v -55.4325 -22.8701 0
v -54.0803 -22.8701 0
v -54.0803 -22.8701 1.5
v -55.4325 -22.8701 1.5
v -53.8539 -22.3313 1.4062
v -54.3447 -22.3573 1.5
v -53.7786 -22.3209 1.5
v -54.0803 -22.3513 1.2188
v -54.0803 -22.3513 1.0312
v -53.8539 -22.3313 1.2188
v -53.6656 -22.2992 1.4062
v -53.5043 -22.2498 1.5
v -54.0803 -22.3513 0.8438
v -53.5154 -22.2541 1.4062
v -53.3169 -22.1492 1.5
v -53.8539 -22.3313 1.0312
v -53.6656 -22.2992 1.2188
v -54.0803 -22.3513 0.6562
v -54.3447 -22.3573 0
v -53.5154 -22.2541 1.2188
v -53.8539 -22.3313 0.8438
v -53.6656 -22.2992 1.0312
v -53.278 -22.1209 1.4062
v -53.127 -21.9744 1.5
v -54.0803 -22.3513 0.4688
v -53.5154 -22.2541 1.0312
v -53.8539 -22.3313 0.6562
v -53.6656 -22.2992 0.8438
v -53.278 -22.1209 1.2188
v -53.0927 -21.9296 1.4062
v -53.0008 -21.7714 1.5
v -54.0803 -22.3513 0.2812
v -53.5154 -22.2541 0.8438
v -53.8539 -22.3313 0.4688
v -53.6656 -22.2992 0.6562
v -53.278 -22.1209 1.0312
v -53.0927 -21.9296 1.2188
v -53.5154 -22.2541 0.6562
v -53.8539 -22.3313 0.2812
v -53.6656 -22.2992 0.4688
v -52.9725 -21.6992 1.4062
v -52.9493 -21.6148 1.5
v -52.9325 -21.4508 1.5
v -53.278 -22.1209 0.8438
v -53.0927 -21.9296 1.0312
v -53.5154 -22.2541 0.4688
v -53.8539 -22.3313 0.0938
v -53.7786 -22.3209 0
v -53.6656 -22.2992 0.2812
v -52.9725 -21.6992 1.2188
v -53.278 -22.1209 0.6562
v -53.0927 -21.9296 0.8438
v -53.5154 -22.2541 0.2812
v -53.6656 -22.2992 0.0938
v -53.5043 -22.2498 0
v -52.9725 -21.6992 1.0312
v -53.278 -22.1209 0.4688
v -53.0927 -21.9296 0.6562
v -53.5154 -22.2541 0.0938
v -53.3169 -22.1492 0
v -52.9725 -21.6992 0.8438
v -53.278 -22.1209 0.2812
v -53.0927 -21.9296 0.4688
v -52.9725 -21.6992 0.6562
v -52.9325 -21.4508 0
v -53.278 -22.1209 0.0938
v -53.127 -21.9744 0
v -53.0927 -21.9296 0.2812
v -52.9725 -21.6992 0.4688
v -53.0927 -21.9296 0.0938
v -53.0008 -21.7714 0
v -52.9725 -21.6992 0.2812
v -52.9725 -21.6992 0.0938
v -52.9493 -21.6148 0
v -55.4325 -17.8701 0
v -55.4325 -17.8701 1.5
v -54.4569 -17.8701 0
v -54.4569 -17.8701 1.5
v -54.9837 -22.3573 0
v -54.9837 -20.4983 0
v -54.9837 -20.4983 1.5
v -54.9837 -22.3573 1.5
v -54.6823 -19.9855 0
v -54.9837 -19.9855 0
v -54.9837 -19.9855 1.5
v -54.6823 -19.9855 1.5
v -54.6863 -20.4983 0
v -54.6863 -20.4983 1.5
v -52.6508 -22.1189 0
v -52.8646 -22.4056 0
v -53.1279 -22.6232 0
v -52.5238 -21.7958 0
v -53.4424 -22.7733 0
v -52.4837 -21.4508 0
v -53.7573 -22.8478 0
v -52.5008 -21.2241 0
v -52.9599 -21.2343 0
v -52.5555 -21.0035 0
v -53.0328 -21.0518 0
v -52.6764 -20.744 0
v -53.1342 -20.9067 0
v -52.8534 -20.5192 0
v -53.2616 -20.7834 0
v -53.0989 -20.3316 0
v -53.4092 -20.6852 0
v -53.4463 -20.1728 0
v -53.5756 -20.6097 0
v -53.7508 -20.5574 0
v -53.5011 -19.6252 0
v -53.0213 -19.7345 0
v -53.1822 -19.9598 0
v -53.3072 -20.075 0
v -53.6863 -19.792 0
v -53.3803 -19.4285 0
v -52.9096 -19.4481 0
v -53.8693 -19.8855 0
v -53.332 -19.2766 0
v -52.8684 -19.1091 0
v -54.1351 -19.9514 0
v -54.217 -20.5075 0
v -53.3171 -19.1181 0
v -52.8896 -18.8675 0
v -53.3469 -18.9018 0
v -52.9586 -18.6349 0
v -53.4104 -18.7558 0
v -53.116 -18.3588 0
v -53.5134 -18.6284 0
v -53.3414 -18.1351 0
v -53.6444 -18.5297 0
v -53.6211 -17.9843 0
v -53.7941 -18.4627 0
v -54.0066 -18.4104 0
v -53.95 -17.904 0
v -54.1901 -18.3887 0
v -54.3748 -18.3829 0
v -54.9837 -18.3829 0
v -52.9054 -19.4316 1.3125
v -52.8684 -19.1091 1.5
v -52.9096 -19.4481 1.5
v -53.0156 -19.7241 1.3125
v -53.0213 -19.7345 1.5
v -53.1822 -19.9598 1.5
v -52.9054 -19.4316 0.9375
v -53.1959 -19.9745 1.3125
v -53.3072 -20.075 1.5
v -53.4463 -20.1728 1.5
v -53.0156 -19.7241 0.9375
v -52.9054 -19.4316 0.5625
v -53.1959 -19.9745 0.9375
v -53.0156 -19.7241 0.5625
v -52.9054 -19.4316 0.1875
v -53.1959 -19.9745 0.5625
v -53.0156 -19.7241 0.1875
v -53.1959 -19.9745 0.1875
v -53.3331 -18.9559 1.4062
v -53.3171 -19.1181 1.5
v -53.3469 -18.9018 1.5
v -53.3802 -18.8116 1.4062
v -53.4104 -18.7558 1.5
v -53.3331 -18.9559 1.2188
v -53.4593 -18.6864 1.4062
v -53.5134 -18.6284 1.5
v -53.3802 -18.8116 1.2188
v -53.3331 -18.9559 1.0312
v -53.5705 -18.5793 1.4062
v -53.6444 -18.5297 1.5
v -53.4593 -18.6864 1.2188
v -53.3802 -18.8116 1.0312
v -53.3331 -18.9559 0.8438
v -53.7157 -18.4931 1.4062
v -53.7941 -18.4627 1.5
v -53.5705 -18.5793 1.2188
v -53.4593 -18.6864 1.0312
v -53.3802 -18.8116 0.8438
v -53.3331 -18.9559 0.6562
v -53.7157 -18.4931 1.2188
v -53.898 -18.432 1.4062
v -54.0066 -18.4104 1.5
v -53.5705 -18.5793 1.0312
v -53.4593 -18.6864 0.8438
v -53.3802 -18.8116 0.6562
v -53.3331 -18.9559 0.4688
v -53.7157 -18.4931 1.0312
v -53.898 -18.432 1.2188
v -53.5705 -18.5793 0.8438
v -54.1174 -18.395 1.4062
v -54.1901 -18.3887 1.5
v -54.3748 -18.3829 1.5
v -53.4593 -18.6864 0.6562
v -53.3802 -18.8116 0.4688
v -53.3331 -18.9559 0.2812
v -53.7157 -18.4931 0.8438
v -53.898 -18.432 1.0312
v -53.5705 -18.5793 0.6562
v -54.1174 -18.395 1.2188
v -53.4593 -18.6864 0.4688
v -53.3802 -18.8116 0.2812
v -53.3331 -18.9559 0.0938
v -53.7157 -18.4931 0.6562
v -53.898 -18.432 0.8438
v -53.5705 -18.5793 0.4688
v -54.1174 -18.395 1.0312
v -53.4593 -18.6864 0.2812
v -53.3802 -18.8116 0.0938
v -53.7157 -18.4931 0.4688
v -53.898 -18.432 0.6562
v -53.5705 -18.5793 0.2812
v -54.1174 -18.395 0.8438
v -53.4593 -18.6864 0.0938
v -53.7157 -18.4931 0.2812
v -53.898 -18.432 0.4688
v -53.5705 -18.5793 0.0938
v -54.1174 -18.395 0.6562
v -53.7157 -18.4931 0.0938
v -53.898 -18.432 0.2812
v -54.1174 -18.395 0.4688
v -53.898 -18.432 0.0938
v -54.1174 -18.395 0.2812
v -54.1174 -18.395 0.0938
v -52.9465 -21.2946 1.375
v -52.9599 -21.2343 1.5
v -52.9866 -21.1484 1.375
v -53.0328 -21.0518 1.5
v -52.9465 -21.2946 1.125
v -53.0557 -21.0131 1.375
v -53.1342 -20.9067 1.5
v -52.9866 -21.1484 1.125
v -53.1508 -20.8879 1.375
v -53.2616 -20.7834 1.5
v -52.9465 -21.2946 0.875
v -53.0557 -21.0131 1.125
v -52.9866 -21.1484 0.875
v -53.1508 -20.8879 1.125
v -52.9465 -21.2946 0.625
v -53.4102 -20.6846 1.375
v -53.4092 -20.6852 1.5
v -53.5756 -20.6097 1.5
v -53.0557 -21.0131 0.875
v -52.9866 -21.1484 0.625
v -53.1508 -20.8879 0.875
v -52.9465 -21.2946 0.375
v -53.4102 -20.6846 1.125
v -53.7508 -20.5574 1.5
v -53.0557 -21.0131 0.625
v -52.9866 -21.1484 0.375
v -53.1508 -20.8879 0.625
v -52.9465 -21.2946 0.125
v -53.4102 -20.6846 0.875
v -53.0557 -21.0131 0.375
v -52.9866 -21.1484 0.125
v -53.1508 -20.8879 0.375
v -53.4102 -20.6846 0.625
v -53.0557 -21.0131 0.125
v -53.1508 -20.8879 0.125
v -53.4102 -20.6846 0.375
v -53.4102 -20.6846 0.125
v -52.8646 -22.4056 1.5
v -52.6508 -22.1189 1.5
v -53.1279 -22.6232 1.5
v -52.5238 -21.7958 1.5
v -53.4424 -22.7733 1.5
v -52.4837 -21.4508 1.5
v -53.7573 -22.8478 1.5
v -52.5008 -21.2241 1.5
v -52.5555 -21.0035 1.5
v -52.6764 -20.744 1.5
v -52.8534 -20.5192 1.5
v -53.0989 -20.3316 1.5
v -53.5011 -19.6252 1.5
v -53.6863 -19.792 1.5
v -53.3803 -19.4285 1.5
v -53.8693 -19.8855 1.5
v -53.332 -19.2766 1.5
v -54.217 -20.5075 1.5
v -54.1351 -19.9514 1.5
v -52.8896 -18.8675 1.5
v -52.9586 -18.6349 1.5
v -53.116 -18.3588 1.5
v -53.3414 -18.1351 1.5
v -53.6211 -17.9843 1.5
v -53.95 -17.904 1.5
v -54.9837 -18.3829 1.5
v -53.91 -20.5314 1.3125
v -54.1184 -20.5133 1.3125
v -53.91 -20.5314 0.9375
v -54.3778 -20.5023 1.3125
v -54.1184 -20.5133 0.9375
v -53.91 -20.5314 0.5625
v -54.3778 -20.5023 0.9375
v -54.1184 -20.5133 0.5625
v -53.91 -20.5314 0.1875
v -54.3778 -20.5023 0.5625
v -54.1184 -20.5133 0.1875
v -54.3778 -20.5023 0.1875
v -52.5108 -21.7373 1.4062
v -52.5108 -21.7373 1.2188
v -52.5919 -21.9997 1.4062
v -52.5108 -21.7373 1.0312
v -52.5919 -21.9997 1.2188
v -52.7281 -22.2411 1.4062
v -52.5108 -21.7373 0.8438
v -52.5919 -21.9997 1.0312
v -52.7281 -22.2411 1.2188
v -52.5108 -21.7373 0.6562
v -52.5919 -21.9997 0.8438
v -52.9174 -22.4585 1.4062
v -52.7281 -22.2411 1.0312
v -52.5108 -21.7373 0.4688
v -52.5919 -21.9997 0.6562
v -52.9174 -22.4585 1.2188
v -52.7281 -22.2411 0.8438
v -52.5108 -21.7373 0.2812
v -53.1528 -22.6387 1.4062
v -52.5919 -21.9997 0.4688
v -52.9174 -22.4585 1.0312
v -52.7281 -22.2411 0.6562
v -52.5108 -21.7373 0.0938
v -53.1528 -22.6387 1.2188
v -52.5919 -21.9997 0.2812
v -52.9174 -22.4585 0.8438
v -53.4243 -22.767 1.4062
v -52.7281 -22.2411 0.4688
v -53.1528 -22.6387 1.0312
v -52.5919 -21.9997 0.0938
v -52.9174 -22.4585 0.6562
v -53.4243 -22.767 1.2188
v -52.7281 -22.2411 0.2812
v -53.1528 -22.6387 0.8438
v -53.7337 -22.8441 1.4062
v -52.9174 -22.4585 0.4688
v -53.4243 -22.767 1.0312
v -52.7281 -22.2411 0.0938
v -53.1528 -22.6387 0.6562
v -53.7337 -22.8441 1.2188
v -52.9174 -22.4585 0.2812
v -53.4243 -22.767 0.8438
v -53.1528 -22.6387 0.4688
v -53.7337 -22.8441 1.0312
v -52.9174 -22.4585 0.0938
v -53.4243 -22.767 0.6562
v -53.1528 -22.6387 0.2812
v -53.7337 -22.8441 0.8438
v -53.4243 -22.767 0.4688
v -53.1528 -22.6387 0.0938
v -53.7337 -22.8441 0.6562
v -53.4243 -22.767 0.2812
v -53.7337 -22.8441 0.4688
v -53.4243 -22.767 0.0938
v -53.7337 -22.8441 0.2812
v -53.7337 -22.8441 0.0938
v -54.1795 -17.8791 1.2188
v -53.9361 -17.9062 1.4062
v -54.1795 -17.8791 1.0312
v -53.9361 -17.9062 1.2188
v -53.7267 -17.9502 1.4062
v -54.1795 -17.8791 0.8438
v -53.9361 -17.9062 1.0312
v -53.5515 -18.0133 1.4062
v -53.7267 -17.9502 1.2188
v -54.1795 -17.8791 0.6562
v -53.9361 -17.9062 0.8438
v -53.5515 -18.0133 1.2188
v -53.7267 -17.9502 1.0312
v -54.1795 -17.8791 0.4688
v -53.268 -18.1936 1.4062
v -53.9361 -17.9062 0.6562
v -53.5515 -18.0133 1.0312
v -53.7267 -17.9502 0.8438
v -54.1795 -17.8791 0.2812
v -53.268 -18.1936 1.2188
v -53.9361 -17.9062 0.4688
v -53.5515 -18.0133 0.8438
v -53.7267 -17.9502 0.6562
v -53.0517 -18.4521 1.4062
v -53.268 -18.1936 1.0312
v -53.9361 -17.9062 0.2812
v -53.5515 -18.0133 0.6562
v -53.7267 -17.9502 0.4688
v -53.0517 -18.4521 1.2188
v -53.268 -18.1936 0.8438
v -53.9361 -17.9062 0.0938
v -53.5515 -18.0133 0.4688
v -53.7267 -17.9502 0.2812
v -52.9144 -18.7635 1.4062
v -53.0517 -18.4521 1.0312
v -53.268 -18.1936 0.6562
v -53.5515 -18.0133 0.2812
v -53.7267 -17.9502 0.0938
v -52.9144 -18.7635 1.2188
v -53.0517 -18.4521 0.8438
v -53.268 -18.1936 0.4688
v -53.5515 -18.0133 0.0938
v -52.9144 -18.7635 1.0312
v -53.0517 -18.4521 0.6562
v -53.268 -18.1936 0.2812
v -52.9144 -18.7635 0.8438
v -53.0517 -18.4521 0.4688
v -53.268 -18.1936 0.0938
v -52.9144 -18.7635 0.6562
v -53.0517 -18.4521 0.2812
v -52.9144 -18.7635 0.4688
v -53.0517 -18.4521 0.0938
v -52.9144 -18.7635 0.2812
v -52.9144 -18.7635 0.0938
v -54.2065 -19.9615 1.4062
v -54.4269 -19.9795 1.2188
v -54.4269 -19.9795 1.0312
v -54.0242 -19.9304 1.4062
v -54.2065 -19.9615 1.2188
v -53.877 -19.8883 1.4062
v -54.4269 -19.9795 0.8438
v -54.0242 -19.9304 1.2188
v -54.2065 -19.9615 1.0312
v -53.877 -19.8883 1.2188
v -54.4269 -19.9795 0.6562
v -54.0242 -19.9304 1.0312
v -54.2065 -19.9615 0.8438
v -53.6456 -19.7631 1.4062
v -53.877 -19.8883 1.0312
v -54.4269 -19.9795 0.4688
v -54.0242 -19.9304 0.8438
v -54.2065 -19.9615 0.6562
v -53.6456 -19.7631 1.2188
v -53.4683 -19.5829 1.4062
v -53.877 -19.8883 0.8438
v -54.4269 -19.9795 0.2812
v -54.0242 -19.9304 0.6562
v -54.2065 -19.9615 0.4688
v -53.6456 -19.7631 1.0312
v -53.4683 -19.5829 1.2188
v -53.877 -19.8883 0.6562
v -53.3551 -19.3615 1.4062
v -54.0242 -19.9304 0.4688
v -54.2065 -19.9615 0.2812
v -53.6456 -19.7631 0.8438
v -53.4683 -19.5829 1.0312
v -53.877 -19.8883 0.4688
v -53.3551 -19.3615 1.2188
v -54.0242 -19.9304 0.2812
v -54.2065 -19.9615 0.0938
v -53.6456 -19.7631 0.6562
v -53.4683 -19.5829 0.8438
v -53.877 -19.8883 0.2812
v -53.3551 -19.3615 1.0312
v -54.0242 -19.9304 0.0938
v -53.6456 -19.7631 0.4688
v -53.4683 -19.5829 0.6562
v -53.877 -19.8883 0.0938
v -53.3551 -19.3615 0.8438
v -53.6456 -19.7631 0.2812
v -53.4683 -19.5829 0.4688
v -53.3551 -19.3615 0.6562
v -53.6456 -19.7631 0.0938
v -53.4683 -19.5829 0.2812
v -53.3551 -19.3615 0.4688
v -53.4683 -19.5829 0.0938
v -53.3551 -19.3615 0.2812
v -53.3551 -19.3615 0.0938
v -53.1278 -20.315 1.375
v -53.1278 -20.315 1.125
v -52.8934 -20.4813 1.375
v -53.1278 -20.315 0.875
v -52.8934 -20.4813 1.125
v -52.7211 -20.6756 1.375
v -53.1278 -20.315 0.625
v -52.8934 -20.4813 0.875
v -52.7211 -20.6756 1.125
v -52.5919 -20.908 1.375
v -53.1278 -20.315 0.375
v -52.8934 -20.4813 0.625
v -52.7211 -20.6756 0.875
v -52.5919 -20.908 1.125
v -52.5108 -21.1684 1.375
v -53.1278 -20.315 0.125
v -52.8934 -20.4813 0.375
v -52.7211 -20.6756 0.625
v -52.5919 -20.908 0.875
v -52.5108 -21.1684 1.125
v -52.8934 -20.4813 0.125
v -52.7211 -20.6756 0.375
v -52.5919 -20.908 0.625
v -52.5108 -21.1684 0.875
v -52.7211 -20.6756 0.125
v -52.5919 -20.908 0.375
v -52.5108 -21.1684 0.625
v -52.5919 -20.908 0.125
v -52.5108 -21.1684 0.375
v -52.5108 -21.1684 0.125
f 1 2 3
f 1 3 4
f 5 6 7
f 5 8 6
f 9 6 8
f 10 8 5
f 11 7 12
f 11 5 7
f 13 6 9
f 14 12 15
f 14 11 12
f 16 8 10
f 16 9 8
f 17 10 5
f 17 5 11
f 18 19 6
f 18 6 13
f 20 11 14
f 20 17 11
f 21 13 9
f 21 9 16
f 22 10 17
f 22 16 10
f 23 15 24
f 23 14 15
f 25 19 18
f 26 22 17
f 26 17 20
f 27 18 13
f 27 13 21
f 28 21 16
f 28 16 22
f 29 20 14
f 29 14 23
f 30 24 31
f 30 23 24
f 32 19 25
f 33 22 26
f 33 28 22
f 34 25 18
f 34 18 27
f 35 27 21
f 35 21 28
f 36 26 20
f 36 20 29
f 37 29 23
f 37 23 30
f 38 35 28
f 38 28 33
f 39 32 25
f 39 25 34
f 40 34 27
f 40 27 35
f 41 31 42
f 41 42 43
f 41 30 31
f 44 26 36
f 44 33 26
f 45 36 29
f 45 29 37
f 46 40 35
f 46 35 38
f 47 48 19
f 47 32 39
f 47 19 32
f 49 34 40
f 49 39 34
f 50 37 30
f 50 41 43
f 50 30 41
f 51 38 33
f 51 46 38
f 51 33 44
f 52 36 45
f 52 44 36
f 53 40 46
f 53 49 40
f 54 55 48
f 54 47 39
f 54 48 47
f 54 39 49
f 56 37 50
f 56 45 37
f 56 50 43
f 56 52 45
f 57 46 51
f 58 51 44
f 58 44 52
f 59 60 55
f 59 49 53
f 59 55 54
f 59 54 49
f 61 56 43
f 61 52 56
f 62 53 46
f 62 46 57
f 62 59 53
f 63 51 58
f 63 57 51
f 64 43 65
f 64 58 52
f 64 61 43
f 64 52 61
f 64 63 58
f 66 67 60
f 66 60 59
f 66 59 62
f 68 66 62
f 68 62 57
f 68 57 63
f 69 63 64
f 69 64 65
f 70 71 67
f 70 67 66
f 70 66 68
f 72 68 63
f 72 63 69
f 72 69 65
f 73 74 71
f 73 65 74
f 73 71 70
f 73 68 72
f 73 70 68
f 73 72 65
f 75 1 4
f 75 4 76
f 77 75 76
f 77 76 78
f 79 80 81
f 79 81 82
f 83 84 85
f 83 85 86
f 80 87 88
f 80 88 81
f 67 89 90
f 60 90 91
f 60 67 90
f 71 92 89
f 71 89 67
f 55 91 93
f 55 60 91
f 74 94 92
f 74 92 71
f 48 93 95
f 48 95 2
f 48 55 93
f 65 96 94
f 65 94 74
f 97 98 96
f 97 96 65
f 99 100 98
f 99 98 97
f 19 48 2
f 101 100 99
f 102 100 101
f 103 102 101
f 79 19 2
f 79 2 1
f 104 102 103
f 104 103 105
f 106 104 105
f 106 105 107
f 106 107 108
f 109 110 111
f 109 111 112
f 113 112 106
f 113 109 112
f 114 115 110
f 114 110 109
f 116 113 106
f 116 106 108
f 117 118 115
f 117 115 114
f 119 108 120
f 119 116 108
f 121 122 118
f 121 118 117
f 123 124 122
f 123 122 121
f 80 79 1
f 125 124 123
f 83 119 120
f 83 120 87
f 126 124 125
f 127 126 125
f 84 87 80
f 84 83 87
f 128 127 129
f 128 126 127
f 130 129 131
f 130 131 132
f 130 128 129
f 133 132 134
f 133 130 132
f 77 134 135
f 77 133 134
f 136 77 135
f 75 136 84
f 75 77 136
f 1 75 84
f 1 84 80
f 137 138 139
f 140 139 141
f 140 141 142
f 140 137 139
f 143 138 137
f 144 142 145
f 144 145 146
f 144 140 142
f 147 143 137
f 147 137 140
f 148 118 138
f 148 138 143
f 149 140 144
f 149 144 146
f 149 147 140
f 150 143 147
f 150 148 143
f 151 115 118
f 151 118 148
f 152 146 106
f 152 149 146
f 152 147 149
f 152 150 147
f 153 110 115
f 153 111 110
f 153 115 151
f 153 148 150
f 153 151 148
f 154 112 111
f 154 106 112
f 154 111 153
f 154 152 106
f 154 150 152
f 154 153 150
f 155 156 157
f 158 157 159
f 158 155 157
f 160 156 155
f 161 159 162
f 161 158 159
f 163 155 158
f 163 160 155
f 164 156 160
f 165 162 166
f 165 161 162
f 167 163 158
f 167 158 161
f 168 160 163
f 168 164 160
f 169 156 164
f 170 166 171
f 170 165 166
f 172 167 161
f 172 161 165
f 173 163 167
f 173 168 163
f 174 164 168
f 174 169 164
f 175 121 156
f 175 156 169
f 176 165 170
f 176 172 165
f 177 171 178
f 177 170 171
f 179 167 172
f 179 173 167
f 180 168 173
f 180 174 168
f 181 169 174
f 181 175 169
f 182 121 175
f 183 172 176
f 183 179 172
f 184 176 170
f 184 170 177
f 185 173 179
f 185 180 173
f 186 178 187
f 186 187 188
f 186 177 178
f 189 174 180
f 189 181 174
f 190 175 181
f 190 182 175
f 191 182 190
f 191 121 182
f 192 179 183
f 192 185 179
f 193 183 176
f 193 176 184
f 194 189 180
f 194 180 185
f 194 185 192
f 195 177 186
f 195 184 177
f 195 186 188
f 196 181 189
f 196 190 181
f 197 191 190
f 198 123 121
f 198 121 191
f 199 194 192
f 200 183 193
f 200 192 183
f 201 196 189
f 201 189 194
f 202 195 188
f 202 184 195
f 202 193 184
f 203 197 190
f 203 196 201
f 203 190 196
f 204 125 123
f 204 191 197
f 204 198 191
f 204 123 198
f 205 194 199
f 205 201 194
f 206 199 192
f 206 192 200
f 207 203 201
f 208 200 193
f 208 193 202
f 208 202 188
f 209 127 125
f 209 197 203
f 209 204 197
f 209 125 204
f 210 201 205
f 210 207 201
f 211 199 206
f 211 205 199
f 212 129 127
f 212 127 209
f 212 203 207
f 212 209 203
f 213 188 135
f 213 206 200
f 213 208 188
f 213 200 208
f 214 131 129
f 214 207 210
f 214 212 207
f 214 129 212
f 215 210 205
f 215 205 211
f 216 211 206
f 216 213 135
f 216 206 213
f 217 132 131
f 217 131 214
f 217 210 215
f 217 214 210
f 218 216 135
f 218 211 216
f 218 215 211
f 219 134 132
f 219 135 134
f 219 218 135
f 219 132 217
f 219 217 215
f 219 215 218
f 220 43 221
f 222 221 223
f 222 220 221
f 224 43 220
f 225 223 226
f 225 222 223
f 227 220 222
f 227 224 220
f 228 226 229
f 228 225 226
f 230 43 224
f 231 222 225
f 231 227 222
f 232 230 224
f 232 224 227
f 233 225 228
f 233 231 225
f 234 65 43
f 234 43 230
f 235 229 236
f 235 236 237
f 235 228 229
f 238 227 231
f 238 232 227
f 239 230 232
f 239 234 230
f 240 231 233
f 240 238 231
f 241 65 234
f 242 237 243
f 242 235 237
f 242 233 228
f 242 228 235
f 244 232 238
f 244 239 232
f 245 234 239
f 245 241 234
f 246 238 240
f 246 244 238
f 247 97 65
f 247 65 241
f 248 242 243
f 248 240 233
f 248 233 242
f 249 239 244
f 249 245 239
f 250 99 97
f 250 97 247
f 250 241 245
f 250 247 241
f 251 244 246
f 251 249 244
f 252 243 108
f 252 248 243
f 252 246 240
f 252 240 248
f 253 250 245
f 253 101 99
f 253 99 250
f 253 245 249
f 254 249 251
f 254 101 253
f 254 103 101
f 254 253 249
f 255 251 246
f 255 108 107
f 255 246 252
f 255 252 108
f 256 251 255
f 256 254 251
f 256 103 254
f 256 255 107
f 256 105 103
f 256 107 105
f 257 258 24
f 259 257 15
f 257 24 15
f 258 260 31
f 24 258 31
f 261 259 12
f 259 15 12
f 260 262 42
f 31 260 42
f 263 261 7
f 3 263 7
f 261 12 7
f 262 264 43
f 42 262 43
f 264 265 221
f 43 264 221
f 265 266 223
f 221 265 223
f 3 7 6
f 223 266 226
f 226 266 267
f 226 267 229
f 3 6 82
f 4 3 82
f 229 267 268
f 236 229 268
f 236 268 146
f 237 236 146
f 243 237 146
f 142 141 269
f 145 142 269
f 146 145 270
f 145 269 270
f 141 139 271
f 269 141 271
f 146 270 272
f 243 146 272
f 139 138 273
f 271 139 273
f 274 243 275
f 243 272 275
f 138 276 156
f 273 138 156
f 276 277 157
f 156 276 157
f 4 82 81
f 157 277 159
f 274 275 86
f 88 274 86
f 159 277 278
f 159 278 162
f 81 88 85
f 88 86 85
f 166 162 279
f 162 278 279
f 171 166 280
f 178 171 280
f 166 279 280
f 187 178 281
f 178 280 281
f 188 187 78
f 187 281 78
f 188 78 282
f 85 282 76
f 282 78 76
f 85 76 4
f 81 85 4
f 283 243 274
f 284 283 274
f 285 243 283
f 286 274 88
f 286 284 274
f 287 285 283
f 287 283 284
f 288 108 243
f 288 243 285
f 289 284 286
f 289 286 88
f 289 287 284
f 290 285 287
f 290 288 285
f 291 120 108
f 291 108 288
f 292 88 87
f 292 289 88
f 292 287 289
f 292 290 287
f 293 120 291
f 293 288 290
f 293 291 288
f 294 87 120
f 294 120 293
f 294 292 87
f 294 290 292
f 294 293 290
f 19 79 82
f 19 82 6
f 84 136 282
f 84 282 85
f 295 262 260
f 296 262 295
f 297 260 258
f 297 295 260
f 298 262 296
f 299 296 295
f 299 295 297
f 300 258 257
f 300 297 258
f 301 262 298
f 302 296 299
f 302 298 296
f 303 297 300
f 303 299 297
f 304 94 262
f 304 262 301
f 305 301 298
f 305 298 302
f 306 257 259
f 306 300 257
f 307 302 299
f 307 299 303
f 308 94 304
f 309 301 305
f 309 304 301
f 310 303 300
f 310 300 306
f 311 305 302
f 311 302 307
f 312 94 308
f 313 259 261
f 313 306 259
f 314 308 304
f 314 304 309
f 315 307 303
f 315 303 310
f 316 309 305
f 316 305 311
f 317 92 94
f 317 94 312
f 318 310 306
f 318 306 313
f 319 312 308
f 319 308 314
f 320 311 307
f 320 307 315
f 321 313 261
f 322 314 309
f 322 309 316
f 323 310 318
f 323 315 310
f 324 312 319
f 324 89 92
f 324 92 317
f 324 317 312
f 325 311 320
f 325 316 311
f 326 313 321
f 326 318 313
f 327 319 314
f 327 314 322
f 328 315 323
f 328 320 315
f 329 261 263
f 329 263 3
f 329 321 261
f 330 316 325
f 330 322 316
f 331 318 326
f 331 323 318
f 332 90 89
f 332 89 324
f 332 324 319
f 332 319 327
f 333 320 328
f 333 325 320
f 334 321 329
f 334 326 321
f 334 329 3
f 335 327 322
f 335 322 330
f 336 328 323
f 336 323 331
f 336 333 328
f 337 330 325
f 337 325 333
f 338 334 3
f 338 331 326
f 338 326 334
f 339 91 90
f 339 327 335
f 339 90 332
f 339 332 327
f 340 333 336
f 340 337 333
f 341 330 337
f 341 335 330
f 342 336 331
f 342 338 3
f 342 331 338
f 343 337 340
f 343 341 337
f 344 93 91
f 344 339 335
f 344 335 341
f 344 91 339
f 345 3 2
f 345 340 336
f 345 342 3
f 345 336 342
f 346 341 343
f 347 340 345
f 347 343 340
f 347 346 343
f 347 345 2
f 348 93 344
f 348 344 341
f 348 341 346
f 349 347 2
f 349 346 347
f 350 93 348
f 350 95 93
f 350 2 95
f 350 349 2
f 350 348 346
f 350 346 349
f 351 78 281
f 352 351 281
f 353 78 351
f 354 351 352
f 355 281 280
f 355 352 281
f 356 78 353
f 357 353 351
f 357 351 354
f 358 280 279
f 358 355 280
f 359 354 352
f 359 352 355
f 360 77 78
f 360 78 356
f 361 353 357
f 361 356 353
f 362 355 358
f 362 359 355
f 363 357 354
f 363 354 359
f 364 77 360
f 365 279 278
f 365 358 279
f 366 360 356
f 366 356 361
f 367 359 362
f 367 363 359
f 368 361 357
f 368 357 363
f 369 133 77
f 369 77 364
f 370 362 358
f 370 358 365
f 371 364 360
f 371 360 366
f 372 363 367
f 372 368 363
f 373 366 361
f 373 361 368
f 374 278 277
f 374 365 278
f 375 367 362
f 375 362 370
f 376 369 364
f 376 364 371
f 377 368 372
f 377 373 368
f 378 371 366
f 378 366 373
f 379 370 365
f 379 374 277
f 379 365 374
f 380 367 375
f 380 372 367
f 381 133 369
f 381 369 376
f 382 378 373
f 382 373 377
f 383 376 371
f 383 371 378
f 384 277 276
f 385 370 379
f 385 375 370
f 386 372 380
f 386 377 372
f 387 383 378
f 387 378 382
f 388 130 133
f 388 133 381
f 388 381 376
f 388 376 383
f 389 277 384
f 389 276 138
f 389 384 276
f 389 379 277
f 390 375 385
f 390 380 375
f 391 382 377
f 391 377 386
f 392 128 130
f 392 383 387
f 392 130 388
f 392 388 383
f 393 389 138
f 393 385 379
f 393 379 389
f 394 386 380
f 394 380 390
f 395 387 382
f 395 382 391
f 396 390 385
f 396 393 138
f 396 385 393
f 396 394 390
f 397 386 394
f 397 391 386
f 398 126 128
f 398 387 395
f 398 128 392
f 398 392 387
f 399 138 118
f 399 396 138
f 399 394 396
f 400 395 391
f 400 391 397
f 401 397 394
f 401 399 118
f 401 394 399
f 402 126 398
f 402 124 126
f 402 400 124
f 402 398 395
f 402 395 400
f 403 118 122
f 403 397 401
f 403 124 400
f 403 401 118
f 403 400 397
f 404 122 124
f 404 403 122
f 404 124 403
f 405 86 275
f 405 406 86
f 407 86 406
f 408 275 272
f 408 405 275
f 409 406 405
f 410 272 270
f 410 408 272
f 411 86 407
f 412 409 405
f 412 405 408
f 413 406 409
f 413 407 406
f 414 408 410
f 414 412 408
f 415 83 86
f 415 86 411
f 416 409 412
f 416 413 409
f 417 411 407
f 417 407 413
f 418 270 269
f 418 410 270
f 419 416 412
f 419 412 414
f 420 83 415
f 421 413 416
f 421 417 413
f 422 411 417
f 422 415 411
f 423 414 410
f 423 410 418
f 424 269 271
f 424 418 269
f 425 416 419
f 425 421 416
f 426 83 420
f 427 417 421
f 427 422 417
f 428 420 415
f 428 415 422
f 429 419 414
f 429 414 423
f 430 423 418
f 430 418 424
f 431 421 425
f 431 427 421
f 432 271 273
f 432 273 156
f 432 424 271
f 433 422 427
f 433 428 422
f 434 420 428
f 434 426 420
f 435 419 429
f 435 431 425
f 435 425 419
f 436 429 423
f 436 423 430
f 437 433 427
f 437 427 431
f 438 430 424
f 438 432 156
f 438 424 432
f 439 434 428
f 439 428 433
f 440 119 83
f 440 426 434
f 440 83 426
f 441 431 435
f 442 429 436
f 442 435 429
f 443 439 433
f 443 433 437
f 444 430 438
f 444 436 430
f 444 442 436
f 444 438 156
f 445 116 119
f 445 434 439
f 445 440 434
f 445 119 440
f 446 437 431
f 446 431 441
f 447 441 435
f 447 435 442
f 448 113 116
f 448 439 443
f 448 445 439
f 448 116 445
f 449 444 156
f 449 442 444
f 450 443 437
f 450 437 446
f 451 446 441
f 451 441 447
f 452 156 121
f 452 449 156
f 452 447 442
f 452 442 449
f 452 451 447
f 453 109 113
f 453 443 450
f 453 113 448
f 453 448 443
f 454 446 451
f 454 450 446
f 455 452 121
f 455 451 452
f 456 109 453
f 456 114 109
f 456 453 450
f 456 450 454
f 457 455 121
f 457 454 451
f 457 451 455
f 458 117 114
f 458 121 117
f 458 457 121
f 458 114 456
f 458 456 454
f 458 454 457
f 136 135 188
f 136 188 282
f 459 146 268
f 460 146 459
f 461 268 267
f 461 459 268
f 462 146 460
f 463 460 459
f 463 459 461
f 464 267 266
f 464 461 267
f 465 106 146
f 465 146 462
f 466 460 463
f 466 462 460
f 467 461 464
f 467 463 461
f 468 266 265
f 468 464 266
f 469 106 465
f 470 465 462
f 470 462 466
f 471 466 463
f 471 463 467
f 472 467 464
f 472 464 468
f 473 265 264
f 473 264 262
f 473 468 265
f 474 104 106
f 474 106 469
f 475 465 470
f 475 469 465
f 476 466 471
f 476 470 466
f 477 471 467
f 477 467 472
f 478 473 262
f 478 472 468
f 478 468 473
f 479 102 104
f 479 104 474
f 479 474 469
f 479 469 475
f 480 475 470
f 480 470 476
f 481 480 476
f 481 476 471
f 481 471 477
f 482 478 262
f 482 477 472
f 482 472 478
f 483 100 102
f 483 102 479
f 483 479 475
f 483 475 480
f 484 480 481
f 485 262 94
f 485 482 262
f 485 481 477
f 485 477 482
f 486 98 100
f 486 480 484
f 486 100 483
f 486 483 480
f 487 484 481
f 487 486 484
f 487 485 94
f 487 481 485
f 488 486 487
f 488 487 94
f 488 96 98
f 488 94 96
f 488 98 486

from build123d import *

# Parameters (mm, degrees)
BOSS_EXTRU_1_DEPTH = 1.5


with BuildPart() as part:
    # Esquisse1 → Boss.-Extru.1 (new body)
    with BuildSketch(Plane.XY):
        with BuildLine():
            Line((-55.432465326, -17.870119076), (-54.456904428, -17.870119076))
            add(Edge.make_bspline(
                [(-54.456904428, -17.870119076), (-54.40914946, -17.870370148), (-54.316588445, -17.870856788), (-54.181989242, -17.878404118), (-54.055919513, -17.888695075), (-53.938342695, -17.905023779), (-53.82931312, -17.924726318), (-53.72850221, -17.948586055), (-53.636230535, -17.977195503), (-53.526069483, -18.022690191), (-53.400468539, -18.090294717), (-53.264470835, -18.190192667), (-53.148179065, -18.3123819), (-53.047912897, -18.450214265), (-52.968197012, -18.601836796), (-52.910526587, -18.763635637), (-52.874015337, -18.93352384), (-52.870260431, -19.050156951), (-52.868362762, -19.109101448)],
                knots=[0, 0, 0, 0, 1.001505555, 1.941167018, 2.826882275, 3.653841531, 4.429895133, 5.150066043, 5.825578002, 6.45369114, 7.647487171, 8.808567382, 9.977351308, 11.170798116, 12.373658725, 13.556498008, 14.765093433, 16, 16, 16, 16], degree=3))
            add(Edge.make_bspline(
                [(-52.868362762, -19.109101448), (-52.869924502, -19.164319385), (-52.87299347, -19.272827838), (-52.902340269, -19.431533708), (-52.948284081, -19.582606878), (-53.012148723, -19.725496), (-53.095151574, -19.85697259), (-53.193520601, -19.978097256), (-53.312201748, -20.083741623), (-53.401120662, -20.142802912), (-53.446287441, -20.172803371)],
                knots=[0, 0, 0, 0, 1.044552857, 2.05264487, 3.044412934, 4.028983338, 5.005914585, 5.980388656, 6.974128949, 8, 8, 8, 8], degree=3))
            add(Edge.make_bspline(
                [(-53.446287441, -20.172803371), (-53.38948683, -20.194610512), (-53.280813191, -20.236332976), (-53.131261745, -20.310097924), (-53.002411966, -20.390329511), (-52.893273186, -20.477946439), (-52.799933679, -20.572387598), (-52.718429477, -20.675037761), (-52.648884657, -20.787235987), (-52.589294766, -20.907812466), (-52.542796543, -21.035535992), (-52.507973823, -21.169208529), (-52.488020324, -21.308350751), (-52.485180836, -21.40304415), (-52.483747377, -21.450848243)],
                knots=[0, 0, 0, 0, 1.27268992, 2.434971085, 3.483601985, 4.442670788, 5.356604649, 6.2567628, 7.179492994, 8.113709626, 9.066344395, 10.018646069, 10.999752585, 12, 12, 12, 12], degree=3))
            add(Edge.make_bspline(
                [(-52.483747377, -21.450848243), (-52.485142871, -21.49965806), (-52.487888546, -21.595692743), (-52.508145648, -21.736771507), (-52.542444372, -21.871592859), (-52.589688867, -22.001028834), (-52.651349317, -22.124829027), (-52.726389266, -22.243133689), (-52.815862928, -22.354754162), (-52.915952741, -22.460930766), (-53.029184377, -22.556399034), (-53.151349741, -22.641421472), (-53.283987341, -22.711344418), (-53.424918761, -22.770081591), (-53.575724927, -22.814949018), (-53.735728652, -22.846338409), (-53.90479194, -22.867488462), (-54.02080587, -22.869227326), (-54.080301864, -22.870119076)],
                knots=[0, 0, 0, 0, 0.978564426, 1.925352924, 2.850884081, 3.763762016, 4.682927383, 5.618979971, 6.567305752, 7.547517671, 8.540179244, 9.531824382, 10.526200242, 11.540722885, 12.589160233, 13.674978461, 14.80764778, 16, 16, 16, 16], degree=3))
            Line((-54.080301864, -22.870119076), (-55.432465326, -22.870119076))
            Line((-55.432465326, -22.870119076), (-55.432465326, -17.870119076))
        make_face()
        with BuildLine():
            Line((-54.983747377, -18.382939589), (-54.983747377, -19.985503692))
            Line((-54.983747377, -19.985503692), (-54.682265005, -19.985503692))
            add(Edge.make_bspline(
                [(-54.682265005, -19.985503692), (-54.638195298, -19.984932373), (-54.553043642, -19.983828469), (-54.429729504, -19.980666302), (-54.315265192, -19.971811954), (-54.209848288, -19.962960151), (-54.113644796, -19.948567883), (-54.026867851, -19.931436279), (-53.94815557, -19.913317843), (-53.857384791, -19.88250429), (-53.754423436, -19.836964754), (-53.644661858, -19.766290703), (-53.54789833, -19.682113055), (-53.466188062, -19.58498311), (-53.399314533, -19.478031416), (-53.352866368, -19.362964444), (-53.321370248, -19.24264997), (-53.318525203, -19.160052466), (-53.31708071, -19.118115871)],
                knots=[0, 0, 0, 0, 1.156816544, 2.235205308, 3.236616184, 4.169592532, 5.011045266, 5.787822928, 6.49130361, 7.128639758, 8.301311294, 9.436451833, 10.541879658, 11.654887649, 12.756523258, 13.837046038, 14.901820046, 16, 16, 16, 16], degree=3))
            add(Edge.make_bspline(
                [(-53.31708071, -19.118115871), (-53.317832396, -19.090364769), (-53.319306911, -19.035927952), (-53.331383057, -18.956571731), (-53.351908164, -18.881937799), (-53.37827144, -18.811003356), (-53.415112423, -18.745986427), (-53.4584888, -18.684639005), (-53.510896929, -18.629050264), (-53.570550232, -18.577093838), (-53.639133979, -18.531030227), (-53.716607253, -18.490686279), (-53.804018221, -18.458199455), (-53.899893728, -18.429747809), (-54.005709567, -18.409764532), (-54.120244643, -18.393116835), (-54.244437099, -18.38464149), (-54.330358674, -18.383519543), (-54.374773018, -18.382939589)],
                knots=[0, 0, 0, 0, 0.91205012, 1.789085906, 2.630437955, 3.453916878, 4.269457761, 5.079663411, 5.91843418, 6.774407191, 7.675494373, 8.627863946, 9.638891023, 10.736472738, 11.911756761, 13.175263542, 14.539845004, 16, 16, 16, 16], degree=3))
            Line((-54.374773018, -18.382939589), (-54.983747377, -18.382939589))
        make_face(mode=Mode.SUBTRACT)
        with BuildLine():
            Line((-54.983747377, -20.498324204), (-54.983747377, -22.357298563))
            Line((-54.983747377, -22.357298563), (-54.344724941, -22.357298563))
            add(Edge.make_bspline(
                [(-54.344724941, -22.357298563), (-54.298983619, -22.356750353), (-54.210823249, -22.355693749), (-54.083535778, -22.352244386), (-53.965559915, -22.344398277), (-53.857434007, -22.332047064), (-53.757990503, -22.318649279), (-53.668422356, -22.300633164), (-53.588003508, -22.279991791), (-53.494754497, -22.248085831), (-53.389749485, -22.198519444), (-53.276591119, -22.123784835), (-53.175982236, -22.034751538), (-53.090546151, -21.931707375), (-53.020527596, -21.819662622), (-52.969591232, -21.700883551), (-52.938175722, -21.577332797), (-52.934372623, -21.493094637), (-52.932465326, -21.450848243)],
                knots=[0, 0, 0, 0, 1.160039823, 2.235823828, 3.228722157, 4.157150951, 4.99529583, 5.772374946, 6.472645482, 7.099169577, 8.269452708, 9.405989375, 10.527446681, 11.663510218, 12.788923519, 13.866172445, 14.929861265, 16, 16, 16, 16], degree=3))
            add(Edge.make_bspline(
                [(-52.932465326, -21.450848243), (-52.932859761, -21.424429185), (-52.933642268, -21.372017211), (-52.945443146, -21.294994612), (-52.962605818, -21.220386222), (-52.98479358, -21.14798945), (-53.017107105, -21.079113198), (-53.05483074, -21.012395256), (-53.099061314, -20.947747428), (-53.167981551, -20.866015637), (-53.268227243, -20.771848476), (-53.410665494, -20.679652044), (-53.57262592, -20.605298034), (-53.690093767, -20.573727353), (-53.750774621, -20.557418756)],
                knots=[0, 0, 0, 0, 0.723448775, 1.435228256, 2.130040452, 2.821711965, 3.505591119, 4.210454504, 4.921174351, 5.648778258, 7.137944449, 8.670945889, 10.280296675, 12, 12, 12, 12], degree=3))
            add(Edge.make_bspline(
                [(-53.750774621, -20.557418756), (-53.775101901, -20.552482921), (-53.827848461, -20.541781015), (-53.91385929, -20.530484296), (-54.012053389, -20.520419924), (-54.122657499, -20.512975413), (-54.245811558, -20.505280351), (-54.381778584, -20.50228775), (-54.53000332, -20.498717378), (-54.632849566, -20.498458615), (-54.686271416, -20.498324204)],
                knots=[0, 0, 0, 0, 0.634451884, 1.375622551, 2.216452059, 3.157844607, 4.20941857, 5.370758133, 6.634282058, 8, 8, 8, 8], degree=3))
            Line((-54.686271416, -20.498324204), (-54.983747377, -20.498324204))
        make_face(mode=Mode.SUBTRACT)
    extrude(amount=BOSS_EXTRU_1_DEPTH)


solid = part.part
